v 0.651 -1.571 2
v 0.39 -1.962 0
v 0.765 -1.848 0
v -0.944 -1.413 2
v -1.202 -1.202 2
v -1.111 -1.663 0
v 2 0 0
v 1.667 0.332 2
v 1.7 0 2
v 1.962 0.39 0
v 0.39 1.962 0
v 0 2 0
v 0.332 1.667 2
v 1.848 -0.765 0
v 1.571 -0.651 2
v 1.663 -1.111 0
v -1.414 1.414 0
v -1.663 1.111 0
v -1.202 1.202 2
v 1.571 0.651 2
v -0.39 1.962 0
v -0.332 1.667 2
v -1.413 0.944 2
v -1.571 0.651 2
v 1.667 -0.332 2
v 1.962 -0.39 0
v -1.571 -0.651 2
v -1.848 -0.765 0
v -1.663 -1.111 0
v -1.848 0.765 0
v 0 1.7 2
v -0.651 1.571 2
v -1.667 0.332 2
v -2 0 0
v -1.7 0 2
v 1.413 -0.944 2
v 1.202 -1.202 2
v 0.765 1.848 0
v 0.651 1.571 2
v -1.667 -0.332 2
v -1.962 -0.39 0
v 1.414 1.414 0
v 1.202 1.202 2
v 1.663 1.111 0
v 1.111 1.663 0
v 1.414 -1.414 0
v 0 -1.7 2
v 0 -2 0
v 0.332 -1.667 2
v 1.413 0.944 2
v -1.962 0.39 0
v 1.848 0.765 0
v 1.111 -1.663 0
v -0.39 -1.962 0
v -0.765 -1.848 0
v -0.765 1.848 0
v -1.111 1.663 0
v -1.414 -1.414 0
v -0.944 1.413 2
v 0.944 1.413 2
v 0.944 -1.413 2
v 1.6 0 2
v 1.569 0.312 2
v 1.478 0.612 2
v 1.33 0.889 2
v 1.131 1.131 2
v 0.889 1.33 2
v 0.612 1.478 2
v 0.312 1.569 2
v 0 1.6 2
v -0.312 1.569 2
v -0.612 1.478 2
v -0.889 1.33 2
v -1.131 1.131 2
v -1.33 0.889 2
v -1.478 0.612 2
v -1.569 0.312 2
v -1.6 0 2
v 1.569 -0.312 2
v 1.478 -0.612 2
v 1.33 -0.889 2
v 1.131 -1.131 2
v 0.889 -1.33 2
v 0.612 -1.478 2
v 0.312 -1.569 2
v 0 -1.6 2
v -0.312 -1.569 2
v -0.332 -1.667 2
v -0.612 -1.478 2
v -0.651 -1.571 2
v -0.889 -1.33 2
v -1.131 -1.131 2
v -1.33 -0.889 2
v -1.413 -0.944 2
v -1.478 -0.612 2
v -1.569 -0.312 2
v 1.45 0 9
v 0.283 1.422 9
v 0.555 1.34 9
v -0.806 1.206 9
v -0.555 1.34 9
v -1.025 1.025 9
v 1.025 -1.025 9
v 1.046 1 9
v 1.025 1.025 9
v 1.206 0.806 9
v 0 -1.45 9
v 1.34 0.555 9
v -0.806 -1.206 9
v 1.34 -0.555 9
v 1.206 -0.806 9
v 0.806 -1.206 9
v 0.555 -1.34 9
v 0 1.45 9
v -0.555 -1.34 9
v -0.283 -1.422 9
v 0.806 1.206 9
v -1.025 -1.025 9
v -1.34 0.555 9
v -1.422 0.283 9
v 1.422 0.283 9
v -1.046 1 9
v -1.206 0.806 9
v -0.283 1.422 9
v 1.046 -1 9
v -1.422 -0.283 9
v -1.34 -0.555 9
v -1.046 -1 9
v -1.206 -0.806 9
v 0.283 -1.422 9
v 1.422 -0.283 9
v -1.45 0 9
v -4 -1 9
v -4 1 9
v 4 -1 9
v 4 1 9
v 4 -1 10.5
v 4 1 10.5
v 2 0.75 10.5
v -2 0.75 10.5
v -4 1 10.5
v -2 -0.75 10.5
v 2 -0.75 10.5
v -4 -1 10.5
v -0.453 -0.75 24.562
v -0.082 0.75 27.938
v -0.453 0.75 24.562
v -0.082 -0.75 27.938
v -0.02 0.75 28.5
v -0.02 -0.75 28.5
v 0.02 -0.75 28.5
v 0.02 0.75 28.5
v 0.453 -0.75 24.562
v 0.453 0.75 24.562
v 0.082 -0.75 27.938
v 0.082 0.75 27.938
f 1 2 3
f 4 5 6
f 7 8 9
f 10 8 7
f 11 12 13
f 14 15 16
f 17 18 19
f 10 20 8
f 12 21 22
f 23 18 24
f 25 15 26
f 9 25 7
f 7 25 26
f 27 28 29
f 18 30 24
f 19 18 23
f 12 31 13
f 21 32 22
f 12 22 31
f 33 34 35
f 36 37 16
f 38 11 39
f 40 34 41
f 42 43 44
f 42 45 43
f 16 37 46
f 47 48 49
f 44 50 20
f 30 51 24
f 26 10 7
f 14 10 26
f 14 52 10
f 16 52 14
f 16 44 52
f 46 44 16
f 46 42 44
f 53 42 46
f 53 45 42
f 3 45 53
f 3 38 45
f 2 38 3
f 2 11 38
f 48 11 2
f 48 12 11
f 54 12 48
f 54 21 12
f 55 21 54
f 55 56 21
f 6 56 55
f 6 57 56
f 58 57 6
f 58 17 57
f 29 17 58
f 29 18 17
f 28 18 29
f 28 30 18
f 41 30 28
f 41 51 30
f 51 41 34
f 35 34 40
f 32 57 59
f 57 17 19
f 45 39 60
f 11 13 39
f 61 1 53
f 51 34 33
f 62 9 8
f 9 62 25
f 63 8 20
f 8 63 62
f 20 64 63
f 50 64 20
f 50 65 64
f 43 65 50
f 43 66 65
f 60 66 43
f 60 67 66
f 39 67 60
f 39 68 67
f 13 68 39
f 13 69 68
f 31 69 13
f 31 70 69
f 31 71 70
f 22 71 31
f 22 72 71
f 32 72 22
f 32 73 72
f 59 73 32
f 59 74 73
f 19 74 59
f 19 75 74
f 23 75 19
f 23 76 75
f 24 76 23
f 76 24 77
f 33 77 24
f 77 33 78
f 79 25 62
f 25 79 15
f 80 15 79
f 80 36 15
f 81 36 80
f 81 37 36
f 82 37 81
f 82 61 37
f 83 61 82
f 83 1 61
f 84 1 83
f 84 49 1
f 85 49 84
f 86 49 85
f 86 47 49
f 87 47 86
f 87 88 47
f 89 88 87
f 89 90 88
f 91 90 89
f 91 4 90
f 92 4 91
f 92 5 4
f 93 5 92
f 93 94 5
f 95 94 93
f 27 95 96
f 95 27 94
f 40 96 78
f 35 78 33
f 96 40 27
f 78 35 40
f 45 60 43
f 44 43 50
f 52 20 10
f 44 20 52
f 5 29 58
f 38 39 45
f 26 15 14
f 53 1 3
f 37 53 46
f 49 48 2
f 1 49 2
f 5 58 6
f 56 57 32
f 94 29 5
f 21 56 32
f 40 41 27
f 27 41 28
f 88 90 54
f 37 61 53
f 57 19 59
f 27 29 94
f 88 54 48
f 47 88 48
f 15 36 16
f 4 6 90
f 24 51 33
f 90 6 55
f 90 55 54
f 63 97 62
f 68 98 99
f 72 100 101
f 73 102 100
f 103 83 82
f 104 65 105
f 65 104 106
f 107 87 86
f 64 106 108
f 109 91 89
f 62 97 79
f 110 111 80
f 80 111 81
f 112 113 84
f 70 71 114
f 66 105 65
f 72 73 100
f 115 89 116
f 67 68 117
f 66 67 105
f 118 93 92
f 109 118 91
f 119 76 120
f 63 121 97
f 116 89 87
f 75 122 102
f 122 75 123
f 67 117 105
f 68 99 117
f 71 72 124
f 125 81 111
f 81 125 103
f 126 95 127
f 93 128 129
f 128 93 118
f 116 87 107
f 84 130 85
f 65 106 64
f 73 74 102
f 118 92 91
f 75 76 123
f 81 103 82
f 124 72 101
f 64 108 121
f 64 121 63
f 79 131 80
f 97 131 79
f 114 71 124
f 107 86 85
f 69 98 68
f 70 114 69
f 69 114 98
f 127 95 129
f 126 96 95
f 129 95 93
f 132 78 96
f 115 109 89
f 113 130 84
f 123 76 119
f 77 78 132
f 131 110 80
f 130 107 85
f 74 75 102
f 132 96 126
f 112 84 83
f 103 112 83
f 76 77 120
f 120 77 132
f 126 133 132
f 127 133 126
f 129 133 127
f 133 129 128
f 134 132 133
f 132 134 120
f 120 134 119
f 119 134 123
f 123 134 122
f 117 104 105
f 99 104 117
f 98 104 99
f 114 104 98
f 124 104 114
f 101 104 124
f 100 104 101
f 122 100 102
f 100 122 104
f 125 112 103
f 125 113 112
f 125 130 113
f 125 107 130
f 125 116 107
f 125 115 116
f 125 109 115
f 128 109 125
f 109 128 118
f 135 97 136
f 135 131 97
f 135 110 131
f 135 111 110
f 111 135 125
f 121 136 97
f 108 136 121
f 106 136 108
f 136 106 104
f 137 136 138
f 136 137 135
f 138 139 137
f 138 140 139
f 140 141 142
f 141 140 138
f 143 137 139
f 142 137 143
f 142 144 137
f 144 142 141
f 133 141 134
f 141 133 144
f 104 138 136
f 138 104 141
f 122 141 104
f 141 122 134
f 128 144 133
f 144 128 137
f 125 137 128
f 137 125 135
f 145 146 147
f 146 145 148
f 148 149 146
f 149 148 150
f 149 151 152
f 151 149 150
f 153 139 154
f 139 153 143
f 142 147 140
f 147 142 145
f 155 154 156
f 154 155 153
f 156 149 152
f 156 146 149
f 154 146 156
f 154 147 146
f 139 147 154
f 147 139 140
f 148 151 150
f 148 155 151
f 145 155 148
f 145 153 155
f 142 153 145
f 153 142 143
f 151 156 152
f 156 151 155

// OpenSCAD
// LEGO Minifigure Knight Sword
// Designed for Bambu Lab P1S
// Print at 0.1mm layer height, 100% infill recommended
// Handle fits LEGO minifigure hand hole (~3.18mm)

$fn = 32;

// === DIMENSIONS (mm) ===
pommel_d      = 4.0;   // pommel diameter
pommel_h      = 2.0;   // pommel height

handle_d_base = 3.2;   // slightly wider at base (taper helps insert into hand)
handle_d_top  = 2.9;   // narrower at top
handle_h      = 7.0;   // handle length

guard_w       = 8.0;   // crossguard width
guard_d       = 2.0;   // crossguard depth
guard_h       = 1.5;   // crossguard thickness

blade_w       = 4.0;   // blade width at base
blade_t       = 1.5;   // blade thickness (flat, looks right at minifig scale)
blade_h       = 18.0;  // blade length

// === ASSEMBLY (bottom to top) ===
union() {

  // Pommel (bottom cap - stops sword sliding through hand)
  cylinder(d1=pommel_d, d2=pommel_d * 0.85, h=pommel_h);

  // Handle (tapered cylinder)
  translate([0, 0, pommel_h])
    cylinder(d1=handle_d_base, d2=handle_d_top, h=handle_h);

  // Crossguard
  translate([-guard_w/2, -guard_d/2, pommel_h + handle_h])
    cube([guard_w, guard_d, guard_h]);

  // Blade (tapers to a point)
  translate([0, 0, pommel_h + handle_h + guard_h])
    linear_extrude(height=blade_h, scale=[0.01, 1])
      square([blade_w, blade_t], center=true);

}
